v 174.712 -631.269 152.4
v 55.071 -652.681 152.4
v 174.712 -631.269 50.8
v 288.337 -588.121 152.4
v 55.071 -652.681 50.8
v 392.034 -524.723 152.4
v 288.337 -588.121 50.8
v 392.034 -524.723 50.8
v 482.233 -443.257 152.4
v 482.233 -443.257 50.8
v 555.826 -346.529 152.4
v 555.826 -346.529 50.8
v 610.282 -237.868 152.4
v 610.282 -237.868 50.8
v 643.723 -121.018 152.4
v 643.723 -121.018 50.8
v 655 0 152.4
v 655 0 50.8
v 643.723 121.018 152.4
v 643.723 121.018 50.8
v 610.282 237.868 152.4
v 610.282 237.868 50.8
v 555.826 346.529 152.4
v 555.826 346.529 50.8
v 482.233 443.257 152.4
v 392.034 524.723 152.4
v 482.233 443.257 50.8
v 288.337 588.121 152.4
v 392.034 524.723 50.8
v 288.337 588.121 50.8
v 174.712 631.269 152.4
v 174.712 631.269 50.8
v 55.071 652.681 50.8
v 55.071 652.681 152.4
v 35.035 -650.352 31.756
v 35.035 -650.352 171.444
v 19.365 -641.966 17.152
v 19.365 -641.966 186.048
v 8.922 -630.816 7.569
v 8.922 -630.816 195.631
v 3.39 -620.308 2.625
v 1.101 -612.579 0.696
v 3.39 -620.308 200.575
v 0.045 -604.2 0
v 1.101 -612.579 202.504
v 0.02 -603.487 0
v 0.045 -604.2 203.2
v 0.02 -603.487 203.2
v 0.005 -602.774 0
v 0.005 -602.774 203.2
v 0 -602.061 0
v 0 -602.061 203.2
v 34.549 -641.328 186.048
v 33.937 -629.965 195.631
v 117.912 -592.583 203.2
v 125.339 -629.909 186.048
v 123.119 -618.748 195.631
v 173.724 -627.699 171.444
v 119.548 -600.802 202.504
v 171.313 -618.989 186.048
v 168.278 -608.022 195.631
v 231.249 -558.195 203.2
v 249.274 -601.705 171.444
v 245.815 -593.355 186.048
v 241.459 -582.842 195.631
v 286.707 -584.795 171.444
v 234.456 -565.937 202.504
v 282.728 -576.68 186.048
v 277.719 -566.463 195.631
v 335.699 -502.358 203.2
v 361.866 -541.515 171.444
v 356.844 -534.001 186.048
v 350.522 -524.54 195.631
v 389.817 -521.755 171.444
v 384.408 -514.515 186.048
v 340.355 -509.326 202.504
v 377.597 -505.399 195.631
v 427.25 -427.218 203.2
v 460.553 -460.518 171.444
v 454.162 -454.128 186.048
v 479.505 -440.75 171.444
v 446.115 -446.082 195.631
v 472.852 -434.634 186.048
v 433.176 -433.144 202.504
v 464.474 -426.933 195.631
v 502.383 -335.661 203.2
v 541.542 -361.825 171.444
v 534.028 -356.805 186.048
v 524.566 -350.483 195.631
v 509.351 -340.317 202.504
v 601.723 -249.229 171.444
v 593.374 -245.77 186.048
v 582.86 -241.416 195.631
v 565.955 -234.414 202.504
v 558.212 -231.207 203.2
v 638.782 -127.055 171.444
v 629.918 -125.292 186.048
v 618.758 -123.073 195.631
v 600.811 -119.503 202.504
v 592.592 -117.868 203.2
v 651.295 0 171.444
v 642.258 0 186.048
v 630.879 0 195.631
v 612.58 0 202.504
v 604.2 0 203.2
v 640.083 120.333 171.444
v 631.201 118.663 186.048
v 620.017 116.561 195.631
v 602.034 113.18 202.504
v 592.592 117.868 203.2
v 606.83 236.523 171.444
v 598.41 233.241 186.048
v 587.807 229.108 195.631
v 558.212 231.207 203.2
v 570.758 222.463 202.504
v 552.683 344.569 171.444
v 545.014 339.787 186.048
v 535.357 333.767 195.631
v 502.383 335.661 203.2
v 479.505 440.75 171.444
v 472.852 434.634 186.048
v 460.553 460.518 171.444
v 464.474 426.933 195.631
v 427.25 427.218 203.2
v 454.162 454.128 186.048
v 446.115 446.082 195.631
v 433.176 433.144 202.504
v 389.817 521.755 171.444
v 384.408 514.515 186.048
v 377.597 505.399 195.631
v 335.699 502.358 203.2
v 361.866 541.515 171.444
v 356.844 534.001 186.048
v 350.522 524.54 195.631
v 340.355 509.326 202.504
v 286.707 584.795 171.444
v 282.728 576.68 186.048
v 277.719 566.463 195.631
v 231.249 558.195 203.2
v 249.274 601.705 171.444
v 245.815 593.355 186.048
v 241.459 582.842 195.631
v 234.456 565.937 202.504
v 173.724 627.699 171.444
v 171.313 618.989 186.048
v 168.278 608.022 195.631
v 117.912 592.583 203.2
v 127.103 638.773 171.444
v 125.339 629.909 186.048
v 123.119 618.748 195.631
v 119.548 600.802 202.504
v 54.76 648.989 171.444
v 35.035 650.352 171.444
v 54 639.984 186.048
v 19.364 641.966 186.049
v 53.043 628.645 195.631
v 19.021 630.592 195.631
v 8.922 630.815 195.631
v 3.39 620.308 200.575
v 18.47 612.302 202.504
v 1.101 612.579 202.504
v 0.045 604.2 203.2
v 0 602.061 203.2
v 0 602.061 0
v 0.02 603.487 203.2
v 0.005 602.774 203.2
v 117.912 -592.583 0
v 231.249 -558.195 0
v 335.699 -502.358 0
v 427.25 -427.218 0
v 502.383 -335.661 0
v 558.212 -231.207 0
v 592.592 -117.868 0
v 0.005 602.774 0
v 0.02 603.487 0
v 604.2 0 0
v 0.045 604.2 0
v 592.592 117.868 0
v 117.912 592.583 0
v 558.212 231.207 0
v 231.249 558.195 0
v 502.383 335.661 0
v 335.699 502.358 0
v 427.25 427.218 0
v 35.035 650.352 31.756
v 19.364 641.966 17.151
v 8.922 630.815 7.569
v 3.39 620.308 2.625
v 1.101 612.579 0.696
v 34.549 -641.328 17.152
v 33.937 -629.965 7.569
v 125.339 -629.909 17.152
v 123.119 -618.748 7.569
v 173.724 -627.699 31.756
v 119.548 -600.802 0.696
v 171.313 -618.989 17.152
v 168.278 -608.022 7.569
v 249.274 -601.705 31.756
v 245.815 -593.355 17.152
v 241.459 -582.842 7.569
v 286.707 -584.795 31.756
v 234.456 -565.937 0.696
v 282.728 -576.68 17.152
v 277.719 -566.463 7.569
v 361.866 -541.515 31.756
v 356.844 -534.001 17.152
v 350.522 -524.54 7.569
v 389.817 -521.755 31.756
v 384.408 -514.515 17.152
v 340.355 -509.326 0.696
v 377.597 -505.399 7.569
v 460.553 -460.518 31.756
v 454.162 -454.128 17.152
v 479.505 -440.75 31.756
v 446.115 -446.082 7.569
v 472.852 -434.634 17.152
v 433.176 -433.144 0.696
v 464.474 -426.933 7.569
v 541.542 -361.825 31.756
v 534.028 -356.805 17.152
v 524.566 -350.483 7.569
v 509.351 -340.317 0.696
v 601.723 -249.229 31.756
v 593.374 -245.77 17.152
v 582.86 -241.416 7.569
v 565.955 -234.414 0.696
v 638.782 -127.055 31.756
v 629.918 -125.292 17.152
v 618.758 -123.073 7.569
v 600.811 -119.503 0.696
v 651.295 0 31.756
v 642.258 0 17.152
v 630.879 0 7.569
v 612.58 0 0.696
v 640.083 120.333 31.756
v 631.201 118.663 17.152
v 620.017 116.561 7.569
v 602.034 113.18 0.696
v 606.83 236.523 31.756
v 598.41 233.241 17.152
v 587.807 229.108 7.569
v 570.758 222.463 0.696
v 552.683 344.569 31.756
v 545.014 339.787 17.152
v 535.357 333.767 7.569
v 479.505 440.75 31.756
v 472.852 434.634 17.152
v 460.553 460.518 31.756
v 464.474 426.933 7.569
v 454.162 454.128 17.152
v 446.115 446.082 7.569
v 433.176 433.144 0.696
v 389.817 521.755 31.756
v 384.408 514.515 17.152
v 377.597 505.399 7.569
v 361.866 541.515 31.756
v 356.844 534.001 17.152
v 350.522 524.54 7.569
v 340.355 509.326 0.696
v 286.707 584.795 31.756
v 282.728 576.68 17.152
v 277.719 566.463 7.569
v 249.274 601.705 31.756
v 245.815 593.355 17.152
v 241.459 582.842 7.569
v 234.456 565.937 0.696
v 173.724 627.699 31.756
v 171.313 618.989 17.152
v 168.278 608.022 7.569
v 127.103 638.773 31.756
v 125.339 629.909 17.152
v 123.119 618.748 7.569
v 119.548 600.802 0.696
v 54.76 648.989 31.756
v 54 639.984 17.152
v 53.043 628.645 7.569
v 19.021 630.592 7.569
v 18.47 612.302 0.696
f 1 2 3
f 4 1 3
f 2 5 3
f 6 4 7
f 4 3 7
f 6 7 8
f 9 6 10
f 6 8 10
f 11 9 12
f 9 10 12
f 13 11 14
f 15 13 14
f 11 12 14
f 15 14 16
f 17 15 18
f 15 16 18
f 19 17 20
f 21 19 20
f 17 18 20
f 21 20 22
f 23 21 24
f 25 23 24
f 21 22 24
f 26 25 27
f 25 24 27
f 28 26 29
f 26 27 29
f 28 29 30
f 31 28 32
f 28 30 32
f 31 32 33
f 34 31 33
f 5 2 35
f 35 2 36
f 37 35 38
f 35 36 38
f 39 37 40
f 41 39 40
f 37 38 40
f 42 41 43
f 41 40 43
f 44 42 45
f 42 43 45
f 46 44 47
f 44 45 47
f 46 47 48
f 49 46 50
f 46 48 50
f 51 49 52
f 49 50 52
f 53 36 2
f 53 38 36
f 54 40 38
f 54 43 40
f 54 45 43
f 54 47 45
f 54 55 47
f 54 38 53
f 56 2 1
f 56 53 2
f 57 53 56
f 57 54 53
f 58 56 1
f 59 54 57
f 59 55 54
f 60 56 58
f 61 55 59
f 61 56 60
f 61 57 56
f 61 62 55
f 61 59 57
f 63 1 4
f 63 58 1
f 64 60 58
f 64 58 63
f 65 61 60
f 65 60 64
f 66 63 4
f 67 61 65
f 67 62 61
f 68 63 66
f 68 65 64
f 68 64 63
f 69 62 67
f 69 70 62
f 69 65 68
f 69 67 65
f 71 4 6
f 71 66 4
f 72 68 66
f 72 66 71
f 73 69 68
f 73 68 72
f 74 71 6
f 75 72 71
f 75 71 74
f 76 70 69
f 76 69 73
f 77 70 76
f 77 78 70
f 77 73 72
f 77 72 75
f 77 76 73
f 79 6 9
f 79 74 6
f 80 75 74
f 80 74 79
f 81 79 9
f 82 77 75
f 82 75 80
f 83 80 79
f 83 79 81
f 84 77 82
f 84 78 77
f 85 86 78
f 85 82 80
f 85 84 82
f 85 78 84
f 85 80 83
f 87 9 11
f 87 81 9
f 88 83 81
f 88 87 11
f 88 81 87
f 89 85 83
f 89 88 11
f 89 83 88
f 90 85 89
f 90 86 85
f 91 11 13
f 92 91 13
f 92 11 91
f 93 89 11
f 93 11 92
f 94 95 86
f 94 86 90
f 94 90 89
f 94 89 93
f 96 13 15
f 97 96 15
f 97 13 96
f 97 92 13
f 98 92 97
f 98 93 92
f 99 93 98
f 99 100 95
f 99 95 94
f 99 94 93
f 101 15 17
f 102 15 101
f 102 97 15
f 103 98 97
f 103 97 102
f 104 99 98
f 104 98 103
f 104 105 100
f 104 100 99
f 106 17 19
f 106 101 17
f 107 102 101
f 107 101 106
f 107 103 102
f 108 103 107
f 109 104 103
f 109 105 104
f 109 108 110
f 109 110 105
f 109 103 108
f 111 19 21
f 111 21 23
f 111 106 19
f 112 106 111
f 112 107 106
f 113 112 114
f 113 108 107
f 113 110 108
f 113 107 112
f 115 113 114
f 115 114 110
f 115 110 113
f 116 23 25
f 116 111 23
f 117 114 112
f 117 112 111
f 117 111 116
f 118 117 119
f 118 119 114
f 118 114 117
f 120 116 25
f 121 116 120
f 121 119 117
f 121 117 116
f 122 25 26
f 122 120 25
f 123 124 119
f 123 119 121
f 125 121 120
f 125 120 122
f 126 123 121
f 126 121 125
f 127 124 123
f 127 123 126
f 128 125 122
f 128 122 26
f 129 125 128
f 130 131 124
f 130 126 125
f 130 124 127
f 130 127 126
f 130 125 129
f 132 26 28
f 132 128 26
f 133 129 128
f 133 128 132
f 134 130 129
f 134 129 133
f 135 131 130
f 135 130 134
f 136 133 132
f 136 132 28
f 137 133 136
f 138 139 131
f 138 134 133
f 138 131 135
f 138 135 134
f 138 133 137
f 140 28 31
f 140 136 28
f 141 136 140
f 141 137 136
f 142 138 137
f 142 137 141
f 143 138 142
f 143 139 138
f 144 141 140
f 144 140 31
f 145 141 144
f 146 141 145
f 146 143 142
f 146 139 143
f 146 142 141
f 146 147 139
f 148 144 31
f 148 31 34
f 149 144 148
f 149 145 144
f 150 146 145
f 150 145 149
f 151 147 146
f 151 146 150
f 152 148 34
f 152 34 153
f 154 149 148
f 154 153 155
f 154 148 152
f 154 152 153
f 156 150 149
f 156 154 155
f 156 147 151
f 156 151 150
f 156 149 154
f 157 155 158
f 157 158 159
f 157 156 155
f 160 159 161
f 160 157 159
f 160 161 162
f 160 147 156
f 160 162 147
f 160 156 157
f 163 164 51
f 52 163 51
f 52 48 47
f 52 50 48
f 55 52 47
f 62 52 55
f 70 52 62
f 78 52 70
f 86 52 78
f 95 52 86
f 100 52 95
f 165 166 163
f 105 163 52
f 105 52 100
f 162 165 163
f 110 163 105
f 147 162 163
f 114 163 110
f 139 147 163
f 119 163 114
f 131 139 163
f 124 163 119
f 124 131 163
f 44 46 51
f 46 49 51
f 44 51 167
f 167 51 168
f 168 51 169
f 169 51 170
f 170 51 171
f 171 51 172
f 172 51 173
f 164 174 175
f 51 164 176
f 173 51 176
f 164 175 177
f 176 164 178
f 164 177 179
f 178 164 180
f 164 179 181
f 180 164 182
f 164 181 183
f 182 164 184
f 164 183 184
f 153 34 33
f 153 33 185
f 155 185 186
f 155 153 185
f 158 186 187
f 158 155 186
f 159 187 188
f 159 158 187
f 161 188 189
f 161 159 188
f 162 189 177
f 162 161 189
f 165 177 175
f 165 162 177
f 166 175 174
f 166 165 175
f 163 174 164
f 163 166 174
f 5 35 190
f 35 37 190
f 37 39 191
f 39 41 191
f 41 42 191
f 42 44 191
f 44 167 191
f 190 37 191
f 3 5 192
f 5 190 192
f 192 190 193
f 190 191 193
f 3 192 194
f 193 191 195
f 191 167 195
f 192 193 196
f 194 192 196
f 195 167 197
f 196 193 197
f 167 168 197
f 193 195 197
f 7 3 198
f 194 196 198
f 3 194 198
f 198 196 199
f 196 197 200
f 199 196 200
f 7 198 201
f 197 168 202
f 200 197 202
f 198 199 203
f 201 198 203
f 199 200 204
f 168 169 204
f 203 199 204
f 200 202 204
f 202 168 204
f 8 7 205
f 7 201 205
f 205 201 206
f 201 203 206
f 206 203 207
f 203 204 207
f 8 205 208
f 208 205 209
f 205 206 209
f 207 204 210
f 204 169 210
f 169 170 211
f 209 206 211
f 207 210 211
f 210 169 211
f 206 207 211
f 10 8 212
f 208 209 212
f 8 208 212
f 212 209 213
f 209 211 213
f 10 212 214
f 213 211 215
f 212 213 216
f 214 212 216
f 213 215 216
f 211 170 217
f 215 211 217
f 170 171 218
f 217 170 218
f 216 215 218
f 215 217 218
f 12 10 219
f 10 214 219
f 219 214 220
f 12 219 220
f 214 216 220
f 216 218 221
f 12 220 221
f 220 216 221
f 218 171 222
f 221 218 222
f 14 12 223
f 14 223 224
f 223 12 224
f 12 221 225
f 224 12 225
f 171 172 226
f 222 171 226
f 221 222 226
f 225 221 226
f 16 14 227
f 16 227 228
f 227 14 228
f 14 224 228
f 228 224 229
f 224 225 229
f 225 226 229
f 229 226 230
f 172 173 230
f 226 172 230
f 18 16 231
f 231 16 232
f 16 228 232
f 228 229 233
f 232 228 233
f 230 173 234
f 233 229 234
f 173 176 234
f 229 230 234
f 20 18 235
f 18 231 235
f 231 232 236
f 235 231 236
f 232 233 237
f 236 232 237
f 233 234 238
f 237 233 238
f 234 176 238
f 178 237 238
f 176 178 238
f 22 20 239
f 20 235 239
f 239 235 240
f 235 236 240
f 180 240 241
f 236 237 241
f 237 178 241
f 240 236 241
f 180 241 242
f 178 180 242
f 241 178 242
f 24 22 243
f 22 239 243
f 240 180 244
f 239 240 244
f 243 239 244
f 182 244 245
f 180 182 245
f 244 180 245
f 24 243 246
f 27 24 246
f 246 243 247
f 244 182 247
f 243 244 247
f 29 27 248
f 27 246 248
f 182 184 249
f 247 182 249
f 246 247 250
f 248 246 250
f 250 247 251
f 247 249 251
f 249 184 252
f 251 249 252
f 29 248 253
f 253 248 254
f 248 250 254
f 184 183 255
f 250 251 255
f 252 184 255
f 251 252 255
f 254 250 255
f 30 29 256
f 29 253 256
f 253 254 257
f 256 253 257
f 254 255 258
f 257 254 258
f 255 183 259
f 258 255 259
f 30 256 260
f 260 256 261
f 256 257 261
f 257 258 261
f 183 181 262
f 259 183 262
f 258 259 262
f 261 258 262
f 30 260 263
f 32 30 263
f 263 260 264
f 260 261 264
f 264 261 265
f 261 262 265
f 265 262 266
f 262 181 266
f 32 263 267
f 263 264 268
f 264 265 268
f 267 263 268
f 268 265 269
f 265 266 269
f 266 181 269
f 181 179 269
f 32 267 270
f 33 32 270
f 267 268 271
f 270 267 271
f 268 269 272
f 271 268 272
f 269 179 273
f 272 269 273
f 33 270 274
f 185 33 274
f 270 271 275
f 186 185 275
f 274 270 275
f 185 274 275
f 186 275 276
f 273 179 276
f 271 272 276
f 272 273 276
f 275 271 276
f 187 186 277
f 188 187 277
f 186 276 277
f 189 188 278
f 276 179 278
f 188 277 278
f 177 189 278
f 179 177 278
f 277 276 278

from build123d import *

# Parameters (mm, degrees)
F1_DEPTH = 203.2
F2_R     = 50.8


with BuildPart() as f1:
    # F0 (on Top) → F1 (new body)
    with BuildSketch(Plane.XY):
        with BuildLine():
            ThreePointArc((0, -654.99996), (654.99996, 0), (0, 654.99996))
            Line((0, 654.99996), (0, -654.99996))
        make_face()
    extrude(amount=F1_DEPTH)

    # F2
    f2_edges = [f1.edges().sort_by_distance(p)[0] for p in [
        (654.99996, 0, 203.2),
        (654.99996, 0, 0),
        (0, 654.99996, 101.6),
        (0, -654.99996, 101.6),
    ]]
    fillet(f2_edges, radius=F2_R)


solid = f1.part
